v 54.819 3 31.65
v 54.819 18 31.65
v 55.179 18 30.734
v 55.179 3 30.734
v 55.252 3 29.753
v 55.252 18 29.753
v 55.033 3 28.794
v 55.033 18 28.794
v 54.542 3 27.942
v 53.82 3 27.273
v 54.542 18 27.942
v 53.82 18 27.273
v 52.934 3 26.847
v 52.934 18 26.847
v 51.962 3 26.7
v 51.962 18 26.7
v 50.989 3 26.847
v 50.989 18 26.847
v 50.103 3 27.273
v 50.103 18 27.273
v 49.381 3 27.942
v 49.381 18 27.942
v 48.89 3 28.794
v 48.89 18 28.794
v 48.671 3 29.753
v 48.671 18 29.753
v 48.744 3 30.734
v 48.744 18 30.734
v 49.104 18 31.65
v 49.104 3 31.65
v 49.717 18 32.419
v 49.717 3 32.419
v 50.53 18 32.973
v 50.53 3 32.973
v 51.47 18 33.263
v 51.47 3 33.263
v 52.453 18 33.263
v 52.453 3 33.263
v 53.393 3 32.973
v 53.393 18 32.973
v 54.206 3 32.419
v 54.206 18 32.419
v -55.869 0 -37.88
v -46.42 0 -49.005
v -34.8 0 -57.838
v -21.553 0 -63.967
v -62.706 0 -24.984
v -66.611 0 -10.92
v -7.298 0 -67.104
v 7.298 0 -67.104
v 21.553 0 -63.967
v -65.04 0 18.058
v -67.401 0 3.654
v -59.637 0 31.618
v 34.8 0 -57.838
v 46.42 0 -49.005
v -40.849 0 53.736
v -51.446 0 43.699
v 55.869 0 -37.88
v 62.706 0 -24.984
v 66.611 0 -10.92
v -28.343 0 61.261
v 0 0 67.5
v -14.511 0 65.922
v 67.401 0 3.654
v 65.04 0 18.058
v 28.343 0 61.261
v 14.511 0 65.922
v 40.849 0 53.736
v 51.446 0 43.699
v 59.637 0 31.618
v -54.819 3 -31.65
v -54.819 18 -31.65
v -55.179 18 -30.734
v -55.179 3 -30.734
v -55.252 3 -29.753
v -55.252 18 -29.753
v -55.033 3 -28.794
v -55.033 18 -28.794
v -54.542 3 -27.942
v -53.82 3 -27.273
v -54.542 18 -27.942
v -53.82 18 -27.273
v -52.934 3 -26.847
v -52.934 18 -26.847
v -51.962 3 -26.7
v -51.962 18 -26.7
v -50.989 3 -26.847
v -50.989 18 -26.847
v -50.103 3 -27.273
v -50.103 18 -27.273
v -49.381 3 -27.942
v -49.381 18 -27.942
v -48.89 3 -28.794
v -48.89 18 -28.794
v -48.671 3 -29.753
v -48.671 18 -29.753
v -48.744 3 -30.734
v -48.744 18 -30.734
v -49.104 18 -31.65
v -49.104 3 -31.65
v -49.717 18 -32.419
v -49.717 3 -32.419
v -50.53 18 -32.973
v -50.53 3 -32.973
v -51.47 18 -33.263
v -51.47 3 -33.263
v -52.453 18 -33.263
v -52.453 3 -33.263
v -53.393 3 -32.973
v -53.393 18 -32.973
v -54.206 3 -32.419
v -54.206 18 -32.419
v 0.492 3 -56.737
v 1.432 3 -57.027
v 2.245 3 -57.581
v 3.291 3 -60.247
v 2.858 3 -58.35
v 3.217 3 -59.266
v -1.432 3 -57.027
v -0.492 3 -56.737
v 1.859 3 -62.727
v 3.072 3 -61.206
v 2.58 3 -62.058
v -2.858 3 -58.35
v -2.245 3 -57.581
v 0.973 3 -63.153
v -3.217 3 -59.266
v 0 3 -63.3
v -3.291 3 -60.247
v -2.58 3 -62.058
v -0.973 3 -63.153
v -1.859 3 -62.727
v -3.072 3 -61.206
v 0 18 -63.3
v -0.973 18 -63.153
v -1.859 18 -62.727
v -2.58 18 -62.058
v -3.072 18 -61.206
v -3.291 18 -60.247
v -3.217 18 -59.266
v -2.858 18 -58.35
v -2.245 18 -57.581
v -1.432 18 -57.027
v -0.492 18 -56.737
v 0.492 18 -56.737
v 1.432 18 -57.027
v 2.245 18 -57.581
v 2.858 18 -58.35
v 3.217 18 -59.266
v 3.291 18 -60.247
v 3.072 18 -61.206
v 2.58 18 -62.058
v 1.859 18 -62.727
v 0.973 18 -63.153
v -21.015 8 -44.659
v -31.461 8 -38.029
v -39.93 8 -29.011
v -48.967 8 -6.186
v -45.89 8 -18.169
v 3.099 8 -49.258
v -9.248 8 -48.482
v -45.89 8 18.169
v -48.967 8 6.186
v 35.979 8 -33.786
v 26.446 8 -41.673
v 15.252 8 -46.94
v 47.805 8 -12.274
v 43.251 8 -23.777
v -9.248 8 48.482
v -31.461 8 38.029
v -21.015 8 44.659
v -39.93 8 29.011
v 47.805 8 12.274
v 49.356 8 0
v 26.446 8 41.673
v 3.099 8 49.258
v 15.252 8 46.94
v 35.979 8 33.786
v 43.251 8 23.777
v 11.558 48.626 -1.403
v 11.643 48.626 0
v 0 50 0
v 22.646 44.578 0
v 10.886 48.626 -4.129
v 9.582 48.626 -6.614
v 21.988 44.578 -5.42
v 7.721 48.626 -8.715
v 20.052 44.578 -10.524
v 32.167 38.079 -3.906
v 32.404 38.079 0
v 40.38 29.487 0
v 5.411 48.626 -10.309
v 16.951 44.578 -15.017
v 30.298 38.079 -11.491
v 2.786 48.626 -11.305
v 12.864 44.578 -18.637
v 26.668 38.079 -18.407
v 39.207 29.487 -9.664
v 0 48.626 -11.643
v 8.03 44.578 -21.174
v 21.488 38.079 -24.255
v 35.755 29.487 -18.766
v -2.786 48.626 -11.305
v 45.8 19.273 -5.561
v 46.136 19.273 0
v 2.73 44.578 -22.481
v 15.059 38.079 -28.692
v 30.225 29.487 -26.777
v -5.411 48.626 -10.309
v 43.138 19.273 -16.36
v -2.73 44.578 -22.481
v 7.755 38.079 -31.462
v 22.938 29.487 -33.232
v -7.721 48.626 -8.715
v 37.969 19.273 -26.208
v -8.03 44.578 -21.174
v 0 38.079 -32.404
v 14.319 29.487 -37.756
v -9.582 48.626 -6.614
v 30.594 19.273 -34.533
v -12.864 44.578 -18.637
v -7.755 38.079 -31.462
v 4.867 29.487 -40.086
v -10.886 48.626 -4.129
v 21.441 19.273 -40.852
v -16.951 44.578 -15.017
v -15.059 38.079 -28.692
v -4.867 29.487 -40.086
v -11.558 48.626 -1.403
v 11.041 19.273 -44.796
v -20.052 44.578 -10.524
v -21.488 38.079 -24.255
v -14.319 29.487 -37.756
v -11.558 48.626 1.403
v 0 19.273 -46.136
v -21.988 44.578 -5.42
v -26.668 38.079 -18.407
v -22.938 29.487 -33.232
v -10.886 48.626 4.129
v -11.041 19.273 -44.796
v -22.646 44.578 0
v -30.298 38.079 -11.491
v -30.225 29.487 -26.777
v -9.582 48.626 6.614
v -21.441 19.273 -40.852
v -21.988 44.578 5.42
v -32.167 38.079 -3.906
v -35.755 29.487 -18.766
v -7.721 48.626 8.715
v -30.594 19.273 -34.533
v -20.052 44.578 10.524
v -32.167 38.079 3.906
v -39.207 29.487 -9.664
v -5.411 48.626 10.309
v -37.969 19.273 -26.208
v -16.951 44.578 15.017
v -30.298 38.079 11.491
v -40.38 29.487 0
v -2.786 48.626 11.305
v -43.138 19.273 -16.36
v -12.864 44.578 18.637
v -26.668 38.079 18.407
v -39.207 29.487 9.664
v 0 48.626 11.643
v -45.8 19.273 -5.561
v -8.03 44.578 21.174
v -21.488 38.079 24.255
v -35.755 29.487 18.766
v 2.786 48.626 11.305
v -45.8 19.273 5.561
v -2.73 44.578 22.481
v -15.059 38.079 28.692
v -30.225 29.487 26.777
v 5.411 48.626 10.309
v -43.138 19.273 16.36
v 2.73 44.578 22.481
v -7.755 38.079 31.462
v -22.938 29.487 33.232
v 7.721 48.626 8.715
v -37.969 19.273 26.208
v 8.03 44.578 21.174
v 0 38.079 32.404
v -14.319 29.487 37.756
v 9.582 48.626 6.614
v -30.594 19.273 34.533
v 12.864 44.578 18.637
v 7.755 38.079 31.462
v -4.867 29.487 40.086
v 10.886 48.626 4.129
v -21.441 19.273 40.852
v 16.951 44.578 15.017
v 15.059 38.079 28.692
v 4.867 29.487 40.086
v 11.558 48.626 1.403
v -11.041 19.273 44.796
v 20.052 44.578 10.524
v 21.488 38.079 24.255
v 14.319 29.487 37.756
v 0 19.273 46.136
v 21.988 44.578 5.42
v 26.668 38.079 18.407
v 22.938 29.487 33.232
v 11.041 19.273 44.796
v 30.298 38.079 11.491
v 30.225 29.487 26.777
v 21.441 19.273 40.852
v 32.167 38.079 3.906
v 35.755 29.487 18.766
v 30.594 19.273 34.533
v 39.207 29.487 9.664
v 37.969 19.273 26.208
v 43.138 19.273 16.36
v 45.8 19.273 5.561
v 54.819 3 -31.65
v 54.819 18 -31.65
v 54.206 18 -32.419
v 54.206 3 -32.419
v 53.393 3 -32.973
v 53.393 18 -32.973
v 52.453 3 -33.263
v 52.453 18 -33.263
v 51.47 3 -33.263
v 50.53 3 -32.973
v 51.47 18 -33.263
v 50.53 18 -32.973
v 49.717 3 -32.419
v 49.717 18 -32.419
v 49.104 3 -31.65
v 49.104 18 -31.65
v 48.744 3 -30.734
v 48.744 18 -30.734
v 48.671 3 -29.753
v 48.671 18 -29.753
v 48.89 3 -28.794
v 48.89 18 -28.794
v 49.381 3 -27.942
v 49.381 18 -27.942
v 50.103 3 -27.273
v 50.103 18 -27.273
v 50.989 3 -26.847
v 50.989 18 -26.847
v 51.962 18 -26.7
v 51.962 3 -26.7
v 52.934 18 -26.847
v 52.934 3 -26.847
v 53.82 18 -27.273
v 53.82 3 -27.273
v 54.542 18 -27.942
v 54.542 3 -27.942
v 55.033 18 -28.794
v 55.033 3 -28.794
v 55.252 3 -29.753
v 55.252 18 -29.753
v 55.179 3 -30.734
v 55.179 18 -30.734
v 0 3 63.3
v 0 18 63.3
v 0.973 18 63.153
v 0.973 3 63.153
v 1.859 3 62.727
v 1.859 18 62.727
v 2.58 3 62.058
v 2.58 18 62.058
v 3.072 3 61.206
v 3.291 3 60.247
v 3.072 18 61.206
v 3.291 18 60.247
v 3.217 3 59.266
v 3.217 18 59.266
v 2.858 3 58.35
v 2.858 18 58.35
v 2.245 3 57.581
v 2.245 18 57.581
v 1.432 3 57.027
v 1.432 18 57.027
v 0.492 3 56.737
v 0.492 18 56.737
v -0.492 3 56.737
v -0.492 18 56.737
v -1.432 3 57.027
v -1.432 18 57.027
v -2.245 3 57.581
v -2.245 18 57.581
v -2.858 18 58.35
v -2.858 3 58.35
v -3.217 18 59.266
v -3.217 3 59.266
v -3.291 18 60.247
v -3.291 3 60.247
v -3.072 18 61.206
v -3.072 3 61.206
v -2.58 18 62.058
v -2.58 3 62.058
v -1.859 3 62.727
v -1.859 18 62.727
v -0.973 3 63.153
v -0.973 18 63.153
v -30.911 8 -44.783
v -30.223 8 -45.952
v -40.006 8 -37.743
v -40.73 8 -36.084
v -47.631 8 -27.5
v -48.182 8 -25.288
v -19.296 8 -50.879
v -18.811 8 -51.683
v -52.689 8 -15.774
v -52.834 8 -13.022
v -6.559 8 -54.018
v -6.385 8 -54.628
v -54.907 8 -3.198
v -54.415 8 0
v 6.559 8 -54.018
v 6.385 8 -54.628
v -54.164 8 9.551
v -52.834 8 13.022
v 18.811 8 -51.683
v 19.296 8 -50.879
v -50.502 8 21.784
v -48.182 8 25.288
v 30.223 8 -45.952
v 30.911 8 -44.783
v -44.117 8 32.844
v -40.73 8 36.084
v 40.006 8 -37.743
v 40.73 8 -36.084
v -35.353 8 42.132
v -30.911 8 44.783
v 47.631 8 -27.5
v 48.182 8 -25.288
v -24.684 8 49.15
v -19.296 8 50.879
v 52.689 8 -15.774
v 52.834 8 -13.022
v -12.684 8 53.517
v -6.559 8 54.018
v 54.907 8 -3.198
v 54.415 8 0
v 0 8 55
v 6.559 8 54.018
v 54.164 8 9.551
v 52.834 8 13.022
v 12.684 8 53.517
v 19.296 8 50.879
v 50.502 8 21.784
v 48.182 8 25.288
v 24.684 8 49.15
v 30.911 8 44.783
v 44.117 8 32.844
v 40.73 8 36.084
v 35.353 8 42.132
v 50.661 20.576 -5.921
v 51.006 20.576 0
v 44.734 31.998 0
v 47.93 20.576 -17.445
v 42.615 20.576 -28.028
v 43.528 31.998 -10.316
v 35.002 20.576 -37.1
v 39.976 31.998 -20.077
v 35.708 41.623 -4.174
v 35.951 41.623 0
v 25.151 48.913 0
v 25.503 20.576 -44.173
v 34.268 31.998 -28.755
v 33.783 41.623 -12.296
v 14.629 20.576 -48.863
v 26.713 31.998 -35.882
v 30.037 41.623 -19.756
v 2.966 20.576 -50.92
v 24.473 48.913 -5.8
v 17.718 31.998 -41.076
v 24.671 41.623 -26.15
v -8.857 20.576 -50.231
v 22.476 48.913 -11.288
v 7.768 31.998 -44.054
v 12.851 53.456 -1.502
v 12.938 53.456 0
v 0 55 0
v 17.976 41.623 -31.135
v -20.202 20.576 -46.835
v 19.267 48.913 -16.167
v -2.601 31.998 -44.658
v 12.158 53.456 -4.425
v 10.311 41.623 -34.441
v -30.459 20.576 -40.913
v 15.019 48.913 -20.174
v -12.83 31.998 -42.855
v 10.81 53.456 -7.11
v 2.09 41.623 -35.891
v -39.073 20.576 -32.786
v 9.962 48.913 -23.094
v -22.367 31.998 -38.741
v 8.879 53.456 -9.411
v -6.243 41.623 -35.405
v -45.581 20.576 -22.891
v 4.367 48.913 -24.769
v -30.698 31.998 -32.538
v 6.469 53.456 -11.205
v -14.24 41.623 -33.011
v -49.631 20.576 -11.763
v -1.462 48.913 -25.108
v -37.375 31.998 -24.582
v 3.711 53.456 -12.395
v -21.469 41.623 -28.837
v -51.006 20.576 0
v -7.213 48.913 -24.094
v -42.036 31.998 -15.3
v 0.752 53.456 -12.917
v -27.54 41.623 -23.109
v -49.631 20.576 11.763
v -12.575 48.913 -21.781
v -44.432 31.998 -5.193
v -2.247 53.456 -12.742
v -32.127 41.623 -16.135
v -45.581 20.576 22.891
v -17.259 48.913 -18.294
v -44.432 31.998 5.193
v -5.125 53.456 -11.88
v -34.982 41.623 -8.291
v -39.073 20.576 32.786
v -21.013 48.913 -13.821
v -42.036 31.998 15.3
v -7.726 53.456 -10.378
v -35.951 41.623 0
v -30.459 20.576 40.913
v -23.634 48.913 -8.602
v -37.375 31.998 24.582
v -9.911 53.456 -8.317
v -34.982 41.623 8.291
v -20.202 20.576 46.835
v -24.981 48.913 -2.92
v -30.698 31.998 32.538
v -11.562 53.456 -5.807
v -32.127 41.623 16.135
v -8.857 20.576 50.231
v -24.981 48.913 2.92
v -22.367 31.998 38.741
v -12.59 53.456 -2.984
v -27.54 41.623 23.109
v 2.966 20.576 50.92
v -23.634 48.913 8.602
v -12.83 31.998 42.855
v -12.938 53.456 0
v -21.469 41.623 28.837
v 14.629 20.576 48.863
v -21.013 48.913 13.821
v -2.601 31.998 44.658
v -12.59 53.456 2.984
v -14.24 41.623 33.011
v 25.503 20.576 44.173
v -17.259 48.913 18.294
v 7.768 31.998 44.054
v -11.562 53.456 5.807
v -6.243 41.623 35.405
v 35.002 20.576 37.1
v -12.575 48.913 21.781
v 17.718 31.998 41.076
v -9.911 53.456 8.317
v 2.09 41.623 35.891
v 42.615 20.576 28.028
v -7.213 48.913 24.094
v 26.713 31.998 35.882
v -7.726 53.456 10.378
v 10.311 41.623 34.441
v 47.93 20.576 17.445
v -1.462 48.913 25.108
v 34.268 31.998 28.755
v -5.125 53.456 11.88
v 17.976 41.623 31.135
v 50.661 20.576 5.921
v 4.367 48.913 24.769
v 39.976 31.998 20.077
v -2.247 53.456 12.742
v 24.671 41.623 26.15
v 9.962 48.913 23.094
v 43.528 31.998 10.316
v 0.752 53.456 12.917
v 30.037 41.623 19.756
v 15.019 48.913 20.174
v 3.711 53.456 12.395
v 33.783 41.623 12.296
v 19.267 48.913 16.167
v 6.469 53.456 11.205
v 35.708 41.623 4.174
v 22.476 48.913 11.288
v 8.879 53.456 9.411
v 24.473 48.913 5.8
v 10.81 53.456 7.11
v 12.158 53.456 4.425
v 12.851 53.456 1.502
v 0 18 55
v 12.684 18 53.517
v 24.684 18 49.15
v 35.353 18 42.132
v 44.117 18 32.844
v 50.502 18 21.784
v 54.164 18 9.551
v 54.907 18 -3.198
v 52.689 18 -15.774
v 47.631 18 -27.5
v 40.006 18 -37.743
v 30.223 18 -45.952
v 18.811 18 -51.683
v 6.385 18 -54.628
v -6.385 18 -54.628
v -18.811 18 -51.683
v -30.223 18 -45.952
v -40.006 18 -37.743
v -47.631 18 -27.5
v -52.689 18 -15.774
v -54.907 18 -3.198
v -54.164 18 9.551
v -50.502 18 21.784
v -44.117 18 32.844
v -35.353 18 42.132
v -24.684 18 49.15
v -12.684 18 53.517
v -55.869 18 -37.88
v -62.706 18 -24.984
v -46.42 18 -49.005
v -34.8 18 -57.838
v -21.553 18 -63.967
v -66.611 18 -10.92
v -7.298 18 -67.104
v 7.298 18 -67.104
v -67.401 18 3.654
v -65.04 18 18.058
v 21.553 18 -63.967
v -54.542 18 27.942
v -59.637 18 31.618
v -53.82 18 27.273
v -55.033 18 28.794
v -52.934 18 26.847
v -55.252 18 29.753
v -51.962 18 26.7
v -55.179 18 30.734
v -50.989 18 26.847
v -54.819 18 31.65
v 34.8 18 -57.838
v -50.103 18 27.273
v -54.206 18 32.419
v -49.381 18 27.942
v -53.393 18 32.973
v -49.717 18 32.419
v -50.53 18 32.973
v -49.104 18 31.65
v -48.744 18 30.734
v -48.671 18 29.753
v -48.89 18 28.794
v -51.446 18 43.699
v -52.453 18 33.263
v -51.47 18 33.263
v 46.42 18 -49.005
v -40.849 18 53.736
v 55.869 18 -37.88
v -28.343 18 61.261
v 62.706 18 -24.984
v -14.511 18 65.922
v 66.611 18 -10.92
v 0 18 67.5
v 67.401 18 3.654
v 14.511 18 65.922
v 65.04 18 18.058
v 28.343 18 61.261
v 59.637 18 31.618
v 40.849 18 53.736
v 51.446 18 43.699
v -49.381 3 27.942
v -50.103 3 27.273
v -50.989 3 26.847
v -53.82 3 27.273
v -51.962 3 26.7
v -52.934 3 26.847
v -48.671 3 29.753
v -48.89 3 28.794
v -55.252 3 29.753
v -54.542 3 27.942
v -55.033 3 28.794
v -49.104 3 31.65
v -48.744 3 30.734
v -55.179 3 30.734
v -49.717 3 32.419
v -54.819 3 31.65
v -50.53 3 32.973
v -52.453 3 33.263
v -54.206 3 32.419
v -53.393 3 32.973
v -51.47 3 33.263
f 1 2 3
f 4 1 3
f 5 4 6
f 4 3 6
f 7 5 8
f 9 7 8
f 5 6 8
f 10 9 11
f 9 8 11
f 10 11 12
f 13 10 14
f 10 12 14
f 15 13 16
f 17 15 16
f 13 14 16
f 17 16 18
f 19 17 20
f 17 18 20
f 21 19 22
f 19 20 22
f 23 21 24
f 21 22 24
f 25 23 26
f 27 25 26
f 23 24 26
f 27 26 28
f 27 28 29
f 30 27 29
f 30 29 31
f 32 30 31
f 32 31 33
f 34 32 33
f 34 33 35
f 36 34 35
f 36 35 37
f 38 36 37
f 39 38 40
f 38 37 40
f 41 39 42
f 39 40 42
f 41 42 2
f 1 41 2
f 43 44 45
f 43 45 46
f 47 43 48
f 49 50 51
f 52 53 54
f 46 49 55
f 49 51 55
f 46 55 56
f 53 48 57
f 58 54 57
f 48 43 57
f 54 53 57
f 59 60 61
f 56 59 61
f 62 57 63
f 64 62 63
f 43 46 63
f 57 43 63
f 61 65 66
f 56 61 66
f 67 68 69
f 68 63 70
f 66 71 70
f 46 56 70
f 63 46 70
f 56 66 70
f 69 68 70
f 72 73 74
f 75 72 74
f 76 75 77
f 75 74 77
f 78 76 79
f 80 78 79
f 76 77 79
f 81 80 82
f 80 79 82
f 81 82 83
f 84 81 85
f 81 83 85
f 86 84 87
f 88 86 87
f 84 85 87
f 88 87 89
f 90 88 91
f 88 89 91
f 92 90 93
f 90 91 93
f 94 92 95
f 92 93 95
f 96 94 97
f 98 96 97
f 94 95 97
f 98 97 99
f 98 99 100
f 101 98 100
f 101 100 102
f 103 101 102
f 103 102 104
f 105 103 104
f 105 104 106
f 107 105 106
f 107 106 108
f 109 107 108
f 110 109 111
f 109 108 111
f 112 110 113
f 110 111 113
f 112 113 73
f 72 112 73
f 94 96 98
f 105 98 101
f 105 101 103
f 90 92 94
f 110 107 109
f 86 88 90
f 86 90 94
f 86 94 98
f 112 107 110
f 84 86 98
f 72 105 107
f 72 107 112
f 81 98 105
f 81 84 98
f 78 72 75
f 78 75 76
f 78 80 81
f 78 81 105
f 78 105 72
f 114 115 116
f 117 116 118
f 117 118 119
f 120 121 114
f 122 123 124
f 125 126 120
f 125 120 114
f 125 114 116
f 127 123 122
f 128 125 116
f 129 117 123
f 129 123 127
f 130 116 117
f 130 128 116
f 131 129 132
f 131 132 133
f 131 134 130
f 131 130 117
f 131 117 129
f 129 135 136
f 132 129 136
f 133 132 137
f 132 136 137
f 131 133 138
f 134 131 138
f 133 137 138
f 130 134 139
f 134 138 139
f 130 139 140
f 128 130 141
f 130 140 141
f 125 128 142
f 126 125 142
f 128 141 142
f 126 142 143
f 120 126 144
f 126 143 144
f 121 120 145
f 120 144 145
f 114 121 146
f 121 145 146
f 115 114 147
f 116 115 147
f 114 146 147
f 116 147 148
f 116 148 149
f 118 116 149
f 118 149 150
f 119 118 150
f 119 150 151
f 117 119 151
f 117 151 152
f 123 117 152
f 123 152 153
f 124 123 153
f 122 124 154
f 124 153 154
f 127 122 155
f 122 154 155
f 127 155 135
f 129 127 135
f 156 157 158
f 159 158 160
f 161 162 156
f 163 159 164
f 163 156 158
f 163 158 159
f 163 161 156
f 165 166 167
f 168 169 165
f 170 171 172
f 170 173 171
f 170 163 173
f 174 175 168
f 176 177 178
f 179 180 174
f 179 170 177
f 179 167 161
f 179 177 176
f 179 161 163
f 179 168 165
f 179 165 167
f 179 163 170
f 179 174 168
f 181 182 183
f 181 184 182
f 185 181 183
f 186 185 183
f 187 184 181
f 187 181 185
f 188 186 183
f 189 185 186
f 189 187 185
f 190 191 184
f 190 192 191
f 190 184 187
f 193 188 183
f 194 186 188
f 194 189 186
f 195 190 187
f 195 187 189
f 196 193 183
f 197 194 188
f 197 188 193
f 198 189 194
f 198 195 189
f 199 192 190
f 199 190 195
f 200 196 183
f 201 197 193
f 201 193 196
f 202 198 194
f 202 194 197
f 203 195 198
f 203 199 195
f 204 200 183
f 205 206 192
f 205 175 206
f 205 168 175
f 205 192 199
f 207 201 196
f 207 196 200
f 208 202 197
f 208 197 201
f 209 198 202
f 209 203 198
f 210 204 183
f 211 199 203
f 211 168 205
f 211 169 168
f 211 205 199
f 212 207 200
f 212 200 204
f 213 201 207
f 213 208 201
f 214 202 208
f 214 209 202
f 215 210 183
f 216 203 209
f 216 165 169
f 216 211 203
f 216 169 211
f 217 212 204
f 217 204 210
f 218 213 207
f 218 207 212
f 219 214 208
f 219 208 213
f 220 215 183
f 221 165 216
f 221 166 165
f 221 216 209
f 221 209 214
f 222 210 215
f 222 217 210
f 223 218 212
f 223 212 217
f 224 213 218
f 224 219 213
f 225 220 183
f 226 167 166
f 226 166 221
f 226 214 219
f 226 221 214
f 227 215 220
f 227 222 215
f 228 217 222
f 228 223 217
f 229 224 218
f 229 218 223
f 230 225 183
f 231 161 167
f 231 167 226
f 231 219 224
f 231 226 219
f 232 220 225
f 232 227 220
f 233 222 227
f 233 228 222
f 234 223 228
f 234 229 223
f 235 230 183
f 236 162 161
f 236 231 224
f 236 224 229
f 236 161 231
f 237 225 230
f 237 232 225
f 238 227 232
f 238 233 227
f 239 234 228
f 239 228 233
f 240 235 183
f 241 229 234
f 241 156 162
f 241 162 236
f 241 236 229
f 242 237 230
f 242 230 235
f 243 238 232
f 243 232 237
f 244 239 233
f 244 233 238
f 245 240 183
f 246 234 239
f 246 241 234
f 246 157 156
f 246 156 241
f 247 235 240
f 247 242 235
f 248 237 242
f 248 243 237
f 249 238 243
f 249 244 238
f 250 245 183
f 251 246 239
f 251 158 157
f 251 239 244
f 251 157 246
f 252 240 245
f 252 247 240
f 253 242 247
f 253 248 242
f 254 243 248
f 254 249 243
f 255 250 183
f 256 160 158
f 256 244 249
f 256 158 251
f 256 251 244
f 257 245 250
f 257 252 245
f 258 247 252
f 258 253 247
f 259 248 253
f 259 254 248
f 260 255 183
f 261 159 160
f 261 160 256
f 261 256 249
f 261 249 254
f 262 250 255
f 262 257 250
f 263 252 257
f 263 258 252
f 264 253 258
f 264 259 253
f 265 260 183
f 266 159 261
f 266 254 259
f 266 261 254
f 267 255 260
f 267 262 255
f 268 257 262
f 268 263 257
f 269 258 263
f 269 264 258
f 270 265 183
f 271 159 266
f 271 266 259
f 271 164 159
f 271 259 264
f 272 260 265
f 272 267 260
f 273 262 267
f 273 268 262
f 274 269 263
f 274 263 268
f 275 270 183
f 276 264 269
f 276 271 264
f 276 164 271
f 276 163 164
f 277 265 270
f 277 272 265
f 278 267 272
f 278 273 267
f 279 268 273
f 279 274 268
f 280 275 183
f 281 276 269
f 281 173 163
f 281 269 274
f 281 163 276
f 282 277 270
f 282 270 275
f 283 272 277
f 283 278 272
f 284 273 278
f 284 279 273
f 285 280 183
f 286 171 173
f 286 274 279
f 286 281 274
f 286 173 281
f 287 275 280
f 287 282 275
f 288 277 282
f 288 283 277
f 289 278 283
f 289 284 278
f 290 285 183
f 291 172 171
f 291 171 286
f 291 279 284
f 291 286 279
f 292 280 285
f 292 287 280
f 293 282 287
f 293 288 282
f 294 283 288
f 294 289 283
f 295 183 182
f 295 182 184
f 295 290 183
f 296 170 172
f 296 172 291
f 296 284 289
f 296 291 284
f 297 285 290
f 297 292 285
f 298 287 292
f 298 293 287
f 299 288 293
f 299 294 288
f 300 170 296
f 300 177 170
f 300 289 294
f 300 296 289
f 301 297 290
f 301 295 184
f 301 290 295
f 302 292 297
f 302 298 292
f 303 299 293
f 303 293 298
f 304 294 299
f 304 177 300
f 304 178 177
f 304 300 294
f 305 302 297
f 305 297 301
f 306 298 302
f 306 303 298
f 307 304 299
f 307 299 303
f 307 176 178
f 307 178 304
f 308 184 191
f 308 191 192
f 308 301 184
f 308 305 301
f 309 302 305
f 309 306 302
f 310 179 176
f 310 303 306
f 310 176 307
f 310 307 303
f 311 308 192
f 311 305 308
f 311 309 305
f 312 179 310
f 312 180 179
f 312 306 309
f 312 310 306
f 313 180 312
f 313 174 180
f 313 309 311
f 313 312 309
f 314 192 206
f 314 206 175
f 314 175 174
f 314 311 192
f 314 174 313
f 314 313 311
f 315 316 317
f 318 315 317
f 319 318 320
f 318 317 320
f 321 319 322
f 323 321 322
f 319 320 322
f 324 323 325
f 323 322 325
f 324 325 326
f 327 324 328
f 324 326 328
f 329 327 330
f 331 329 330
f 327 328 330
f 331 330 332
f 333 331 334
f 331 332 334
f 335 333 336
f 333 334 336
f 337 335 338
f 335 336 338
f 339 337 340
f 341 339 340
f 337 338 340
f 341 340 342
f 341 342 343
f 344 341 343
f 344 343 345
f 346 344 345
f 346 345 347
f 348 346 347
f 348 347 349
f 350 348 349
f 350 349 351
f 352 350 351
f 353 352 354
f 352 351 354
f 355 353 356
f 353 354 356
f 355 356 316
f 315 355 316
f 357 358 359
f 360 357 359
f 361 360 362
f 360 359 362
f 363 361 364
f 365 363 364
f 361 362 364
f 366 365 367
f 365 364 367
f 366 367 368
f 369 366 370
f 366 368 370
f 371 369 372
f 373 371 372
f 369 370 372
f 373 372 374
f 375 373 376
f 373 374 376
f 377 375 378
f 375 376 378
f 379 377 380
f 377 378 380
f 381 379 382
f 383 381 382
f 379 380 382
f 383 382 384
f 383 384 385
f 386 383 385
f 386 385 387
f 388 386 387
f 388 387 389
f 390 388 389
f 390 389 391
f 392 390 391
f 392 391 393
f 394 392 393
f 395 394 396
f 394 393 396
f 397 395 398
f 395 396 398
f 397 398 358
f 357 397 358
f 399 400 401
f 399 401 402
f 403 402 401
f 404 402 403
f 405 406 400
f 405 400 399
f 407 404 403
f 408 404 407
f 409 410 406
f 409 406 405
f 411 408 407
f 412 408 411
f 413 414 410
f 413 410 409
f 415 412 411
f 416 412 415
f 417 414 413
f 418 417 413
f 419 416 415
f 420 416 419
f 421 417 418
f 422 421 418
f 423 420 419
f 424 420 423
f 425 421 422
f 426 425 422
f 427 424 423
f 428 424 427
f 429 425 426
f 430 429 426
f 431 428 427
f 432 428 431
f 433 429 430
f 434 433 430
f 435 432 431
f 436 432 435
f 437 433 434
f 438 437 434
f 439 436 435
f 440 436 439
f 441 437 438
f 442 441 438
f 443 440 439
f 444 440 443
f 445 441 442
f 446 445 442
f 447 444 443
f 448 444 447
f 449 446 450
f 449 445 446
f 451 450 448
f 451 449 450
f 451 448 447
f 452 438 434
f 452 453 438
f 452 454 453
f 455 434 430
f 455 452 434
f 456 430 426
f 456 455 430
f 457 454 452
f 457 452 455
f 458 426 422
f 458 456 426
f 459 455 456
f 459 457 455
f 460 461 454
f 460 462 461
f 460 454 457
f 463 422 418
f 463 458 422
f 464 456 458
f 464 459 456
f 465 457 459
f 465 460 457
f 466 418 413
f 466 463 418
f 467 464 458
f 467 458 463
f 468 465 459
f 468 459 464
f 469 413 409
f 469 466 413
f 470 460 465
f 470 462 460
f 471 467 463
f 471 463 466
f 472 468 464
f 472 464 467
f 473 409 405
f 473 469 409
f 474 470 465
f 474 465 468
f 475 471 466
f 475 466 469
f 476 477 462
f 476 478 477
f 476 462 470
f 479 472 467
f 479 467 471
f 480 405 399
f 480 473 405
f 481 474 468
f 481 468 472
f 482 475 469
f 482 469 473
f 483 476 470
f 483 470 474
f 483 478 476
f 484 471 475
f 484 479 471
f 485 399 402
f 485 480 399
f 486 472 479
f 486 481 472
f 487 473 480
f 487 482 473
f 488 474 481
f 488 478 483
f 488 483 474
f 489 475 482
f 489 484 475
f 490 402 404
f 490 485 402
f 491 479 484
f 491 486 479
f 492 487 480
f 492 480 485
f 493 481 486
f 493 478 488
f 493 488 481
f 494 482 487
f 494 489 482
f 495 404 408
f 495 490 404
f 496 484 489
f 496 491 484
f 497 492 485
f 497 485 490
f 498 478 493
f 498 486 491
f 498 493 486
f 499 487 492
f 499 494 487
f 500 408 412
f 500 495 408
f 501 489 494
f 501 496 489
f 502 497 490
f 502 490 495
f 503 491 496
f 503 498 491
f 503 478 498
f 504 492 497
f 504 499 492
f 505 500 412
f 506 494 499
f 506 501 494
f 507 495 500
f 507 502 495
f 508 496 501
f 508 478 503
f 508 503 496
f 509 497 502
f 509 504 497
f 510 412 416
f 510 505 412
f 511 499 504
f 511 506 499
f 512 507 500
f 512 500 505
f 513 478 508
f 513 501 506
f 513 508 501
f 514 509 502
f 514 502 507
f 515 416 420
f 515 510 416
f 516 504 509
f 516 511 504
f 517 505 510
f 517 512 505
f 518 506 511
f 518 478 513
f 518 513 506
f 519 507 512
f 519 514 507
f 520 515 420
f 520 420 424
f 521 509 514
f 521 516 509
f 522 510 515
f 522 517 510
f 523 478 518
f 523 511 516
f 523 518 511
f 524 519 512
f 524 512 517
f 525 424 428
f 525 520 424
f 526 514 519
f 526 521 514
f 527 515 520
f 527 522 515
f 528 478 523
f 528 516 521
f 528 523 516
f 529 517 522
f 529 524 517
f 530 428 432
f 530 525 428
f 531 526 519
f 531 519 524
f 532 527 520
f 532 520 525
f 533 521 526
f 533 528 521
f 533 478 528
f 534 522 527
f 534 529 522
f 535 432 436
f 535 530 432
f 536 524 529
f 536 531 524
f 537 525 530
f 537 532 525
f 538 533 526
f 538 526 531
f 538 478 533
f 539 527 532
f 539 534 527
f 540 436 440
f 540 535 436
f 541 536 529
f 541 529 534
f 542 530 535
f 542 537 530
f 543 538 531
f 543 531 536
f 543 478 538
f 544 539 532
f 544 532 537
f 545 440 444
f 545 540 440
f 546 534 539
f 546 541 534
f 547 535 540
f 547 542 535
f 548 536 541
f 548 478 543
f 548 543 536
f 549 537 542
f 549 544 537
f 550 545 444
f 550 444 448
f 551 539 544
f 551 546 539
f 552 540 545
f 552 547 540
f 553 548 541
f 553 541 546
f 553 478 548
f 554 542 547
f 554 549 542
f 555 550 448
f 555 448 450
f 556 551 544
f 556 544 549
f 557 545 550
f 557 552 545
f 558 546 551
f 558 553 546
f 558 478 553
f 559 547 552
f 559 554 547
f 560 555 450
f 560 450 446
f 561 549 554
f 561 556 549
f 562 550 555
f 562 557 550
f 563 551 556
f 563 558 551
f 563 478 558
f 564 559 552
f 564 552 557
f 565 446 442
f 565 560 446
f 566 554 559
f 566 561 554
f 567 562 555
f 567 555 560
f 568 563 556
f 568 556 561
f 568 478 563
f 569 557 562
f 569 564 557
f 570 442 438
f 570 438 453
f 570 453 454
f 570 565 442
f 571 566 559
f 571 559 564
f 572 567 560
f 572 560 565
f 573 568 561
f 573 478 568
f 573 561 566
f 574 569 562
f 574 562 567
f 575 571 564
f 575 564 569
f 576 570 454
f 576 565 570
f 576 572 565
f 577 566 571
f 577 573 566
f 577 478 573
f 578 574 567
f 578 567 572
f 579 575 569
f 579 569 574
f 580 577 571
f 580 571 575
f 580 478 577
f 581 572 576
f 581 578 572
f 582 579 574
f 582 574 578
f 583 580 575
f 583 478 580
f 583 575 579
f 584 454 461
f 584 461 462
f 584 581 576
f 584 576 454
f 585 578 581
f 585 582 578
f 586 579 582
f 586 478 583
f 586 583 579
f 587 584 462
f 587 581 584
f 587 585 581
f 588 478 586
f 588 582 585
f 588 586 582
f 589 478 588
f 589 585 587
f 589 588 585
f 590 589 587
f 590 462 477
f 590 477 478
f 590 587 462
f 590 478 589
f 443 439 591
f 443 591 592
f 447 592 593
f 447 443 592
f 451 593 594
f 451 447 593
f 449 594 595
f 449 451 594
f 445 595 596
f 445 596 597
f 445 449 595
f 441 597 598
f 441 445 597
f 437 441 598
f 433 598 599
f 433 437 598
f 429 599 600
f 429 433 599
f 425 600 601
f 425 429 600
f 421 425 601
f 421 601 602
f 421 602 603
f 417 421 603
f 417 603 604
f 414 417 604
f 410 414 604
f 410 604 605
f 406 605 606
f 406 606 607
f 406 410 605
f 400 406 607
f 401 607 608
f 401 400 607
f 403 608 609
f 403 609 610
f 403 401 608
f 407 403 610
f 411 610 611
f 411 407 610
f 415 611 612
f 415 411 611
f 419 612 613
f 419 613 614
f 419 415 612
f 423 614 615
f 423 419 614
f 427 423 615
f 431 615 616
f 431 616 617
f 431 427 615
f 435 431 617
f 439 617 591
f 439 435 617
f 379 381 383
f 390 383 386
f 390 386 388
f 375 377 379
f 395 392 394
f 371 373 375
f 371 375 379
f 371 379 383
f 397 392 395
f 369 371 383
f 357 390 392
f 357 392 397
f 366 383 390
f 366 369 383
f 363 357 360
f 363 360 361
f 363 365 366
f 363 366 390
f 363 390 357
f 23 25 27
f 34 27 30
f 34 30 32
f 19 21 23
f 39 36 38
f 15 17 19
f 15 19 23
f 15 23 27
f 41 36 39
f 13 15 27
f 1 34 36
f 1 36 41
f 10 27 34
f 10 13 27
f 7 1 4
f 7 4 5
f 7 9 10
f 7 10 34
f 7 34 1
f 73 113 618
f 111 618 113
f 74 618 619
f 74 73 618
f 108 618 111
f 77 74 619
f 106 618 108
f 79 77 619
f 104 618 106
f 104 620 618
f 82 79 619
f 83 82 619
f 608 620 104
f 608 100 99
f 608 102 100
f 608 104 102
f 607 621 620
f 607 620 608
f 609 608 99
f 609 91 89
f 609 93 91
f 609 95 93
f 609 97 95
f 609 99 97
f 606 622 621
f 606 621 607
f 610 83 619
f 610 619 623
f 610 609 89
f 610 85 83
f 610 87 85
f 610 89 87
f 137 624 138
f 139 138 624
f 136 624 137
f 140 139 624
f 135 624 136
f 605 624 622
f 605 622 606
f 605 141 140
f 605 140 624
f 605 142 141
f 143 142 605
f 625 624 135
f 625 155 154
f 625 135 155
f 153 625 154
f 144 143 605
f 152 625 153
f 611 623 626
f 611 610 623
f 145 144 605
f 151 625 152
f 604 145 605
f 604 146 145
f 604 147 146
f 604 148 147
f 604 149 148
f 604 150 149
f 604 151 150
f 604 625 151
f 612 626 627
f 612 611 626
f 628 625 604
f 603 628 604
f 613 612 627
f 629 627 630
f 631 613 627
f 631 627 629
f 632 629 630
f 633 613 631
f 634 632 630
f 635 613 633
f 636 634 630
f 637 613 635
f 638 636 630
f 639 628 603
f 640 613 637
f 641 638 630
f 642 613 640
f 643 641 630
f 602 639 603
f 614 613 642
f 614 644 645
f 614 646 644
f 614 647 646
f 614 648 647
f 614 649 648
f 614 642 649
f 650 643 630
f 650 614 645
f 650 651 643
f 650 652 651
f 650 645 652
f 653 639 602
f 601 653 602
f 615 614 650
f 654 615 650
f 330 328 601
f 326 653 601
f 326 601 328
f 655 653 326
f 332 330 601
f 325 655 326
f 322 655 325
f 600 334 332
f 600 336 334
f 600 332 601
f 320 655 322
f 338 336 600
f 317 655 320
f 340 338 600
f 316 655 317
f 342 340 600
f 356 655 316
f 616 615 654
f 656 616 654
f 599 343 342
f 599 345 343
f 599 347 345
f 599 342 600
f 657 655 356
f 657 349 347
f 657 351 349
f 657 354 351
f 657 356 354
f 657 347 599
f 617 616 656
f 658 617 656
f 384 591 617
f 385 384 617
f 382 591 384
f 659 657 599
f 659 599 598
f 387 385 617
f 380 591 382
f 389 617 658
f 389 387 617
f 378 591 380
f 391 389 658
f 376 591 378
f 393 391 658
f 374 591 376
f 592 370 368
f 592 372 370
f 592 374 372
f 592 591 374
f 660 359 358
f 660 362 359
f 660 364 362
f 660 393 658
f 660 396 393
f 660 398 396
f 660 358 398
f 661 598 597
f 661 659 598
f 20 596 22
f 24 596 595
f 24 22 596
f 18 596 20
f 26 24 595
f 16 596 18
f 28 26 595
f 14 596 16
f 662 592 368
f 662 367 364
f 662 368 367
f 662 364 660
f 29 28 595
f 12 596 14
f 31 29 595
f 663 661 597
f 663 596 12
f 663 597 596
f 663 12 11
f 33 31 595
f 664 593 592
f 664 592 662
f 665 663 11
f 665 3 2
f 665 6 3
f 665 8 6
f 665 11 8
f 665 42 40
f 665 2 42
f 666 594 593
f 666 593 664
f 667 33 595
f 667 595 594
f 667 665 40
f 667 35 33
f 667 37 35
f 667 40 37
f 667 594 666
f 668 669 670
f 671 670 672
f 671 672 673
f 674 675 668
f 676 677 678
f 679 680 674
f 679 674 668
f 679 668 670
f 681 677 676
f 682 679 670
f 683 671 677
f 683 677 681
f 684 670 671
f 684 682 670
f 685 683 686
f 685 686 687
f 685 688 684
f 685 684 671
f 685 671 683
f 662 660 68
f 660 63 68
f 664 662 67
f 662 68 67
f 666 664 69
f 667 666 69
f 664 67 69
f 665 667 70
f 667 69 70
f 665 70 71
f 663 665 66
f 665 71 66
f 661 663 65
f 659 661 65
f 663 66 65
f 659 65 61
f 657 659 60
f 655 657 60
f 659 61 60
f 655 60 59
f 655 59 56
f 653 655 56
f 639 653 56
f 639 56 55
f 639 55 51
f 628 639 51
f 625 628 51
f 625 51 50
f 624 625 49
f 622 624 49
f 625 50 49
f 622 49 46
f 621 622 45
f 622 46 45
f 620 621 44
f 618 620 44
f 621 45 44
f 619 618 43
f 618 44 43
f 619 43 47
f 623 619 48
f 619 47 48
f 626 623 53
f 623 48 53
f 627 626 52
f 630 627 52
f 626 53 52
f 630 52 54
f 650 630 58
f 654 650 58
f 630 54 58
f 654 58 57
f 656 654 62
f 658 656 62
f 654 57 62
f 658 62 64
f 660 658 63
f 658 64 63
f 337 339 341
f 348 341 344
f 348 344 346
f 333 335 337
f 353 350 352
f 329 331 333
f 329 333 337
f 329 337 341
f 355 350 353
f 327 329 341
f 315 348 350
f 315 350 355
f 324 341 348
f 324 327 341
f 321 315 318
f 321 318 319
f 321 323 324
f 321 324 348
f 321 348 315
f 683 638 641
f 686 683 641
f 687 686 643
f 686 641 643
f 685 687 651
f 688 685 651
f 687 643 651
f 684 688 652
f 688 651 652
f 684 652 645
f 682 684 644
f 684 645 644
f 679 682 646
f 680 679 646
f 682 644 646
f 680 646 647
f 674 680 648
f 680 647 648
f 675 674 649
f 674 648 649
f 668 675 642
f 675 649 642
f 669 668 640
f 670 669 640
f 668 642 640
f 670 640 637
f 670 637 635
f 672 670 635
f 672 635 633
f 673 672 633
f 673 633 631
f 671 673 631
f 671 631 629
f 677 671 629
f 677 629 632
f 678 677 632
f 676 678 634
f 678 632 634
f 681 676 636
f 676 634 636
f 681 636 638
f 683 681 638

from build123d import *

# Parameters (mm, degrees)
SKETCH2_R           = 67.5
BOSS_EXTRUDE1_DEPTH = 8
SKETCH6_R           = 67.5
SKETCH6_R_2         = 55
BOSS_EXTRUDE2_DEPTH = 10
SKETCH7_R           = 3.3
CUT_EXTRUDE3_DEPTH  = 15
CIRPATTERN2_COUNT   = 6


with BuildPart() as part:
    # Sketch1 → Revolve1 (revolve)
    with BuildSketch(Plane.XY, mode=Mode.PRIVATE) as revolve1_sk:
        with BuildLine():
            Line((-65, 0), (-65, 5))
            Line((-65, 5), (-54.772255751, 5))
            ThreePointArc((-54.772255751, 5), (-37.080992435, 40.620192023), (0, 55))
            Line((0, 55), (0, 50))
            ThreePointArc((0, 50), (-35.355339059, 35.355339059), (-50, 0))
            Line((-50, 0), (-65, 0))
        make_face()
    revolve(revolve1_sk.sketch.rotate(Axis((0, 0, 0), (0, 1, 0)), 180), axis=Axis((0, 0, 0), (0, 1, 0)))

    # Sketch2 → Boss-Extrude1 (add)
    with BuildSketch(Plane(origin=(0, 0, 0), x_dir=(1, 0, 0), z_dir=(0, 1, 0))):
        with Locations(Location((0, 0, 0), (0, 0, 270))):
            Circle(SKETCH2_R)
    extrude(amount=BOSS_EXTRUDE1_DEPTH)

    # Sketch6 → Boss-Extrude2 (add)
    with BuildSketch(Plane(origin=(0, 8, 0), x_dir=(1, 0, 0), z_dir=(0, 1, 0))):
        with Locations(Location((0, 0, 0), (0, 0, 270))):
            Circle(SKETCH6_R)
        with Locations(Location((0, 0, 0), (0, 0, 270))):
            Circle(SKETCH6_R_2, mode=Mode.SUBTRACT)
    extrude(amount=BOSS_EXTRUDE2_DEPTH)

    # Sketch7 → Cut-Extrude3 (cut)
    with BuildSketch(Plane(origin=(0, 18, 0), x_dir=(1, 0, 0), z_dir=(0, 1, 0))):
        with Locations(Location((0, -60, 0), (0, 0, 270))):
            Circle(SKETCH7_R)
    cut_extrude3 = extrude(amount=-CUT_EXTRUDE3_DEPTH, mode=Mode.SUBTRACT)

    # CirPattern2: Cut-Extrude3 ×6 about axis
    cirpattern2_axis = Axis((0, 0, 0), (0, 1, 0))
    for i in range(1, CIRPATTERN2_COUNT):
        add(cut_extrude3.rotate(cirpattern2_axis, i * 360 / CIRPATTERN2_COUNT), mode=Mode.SUBTRACT)


solid = part.part
